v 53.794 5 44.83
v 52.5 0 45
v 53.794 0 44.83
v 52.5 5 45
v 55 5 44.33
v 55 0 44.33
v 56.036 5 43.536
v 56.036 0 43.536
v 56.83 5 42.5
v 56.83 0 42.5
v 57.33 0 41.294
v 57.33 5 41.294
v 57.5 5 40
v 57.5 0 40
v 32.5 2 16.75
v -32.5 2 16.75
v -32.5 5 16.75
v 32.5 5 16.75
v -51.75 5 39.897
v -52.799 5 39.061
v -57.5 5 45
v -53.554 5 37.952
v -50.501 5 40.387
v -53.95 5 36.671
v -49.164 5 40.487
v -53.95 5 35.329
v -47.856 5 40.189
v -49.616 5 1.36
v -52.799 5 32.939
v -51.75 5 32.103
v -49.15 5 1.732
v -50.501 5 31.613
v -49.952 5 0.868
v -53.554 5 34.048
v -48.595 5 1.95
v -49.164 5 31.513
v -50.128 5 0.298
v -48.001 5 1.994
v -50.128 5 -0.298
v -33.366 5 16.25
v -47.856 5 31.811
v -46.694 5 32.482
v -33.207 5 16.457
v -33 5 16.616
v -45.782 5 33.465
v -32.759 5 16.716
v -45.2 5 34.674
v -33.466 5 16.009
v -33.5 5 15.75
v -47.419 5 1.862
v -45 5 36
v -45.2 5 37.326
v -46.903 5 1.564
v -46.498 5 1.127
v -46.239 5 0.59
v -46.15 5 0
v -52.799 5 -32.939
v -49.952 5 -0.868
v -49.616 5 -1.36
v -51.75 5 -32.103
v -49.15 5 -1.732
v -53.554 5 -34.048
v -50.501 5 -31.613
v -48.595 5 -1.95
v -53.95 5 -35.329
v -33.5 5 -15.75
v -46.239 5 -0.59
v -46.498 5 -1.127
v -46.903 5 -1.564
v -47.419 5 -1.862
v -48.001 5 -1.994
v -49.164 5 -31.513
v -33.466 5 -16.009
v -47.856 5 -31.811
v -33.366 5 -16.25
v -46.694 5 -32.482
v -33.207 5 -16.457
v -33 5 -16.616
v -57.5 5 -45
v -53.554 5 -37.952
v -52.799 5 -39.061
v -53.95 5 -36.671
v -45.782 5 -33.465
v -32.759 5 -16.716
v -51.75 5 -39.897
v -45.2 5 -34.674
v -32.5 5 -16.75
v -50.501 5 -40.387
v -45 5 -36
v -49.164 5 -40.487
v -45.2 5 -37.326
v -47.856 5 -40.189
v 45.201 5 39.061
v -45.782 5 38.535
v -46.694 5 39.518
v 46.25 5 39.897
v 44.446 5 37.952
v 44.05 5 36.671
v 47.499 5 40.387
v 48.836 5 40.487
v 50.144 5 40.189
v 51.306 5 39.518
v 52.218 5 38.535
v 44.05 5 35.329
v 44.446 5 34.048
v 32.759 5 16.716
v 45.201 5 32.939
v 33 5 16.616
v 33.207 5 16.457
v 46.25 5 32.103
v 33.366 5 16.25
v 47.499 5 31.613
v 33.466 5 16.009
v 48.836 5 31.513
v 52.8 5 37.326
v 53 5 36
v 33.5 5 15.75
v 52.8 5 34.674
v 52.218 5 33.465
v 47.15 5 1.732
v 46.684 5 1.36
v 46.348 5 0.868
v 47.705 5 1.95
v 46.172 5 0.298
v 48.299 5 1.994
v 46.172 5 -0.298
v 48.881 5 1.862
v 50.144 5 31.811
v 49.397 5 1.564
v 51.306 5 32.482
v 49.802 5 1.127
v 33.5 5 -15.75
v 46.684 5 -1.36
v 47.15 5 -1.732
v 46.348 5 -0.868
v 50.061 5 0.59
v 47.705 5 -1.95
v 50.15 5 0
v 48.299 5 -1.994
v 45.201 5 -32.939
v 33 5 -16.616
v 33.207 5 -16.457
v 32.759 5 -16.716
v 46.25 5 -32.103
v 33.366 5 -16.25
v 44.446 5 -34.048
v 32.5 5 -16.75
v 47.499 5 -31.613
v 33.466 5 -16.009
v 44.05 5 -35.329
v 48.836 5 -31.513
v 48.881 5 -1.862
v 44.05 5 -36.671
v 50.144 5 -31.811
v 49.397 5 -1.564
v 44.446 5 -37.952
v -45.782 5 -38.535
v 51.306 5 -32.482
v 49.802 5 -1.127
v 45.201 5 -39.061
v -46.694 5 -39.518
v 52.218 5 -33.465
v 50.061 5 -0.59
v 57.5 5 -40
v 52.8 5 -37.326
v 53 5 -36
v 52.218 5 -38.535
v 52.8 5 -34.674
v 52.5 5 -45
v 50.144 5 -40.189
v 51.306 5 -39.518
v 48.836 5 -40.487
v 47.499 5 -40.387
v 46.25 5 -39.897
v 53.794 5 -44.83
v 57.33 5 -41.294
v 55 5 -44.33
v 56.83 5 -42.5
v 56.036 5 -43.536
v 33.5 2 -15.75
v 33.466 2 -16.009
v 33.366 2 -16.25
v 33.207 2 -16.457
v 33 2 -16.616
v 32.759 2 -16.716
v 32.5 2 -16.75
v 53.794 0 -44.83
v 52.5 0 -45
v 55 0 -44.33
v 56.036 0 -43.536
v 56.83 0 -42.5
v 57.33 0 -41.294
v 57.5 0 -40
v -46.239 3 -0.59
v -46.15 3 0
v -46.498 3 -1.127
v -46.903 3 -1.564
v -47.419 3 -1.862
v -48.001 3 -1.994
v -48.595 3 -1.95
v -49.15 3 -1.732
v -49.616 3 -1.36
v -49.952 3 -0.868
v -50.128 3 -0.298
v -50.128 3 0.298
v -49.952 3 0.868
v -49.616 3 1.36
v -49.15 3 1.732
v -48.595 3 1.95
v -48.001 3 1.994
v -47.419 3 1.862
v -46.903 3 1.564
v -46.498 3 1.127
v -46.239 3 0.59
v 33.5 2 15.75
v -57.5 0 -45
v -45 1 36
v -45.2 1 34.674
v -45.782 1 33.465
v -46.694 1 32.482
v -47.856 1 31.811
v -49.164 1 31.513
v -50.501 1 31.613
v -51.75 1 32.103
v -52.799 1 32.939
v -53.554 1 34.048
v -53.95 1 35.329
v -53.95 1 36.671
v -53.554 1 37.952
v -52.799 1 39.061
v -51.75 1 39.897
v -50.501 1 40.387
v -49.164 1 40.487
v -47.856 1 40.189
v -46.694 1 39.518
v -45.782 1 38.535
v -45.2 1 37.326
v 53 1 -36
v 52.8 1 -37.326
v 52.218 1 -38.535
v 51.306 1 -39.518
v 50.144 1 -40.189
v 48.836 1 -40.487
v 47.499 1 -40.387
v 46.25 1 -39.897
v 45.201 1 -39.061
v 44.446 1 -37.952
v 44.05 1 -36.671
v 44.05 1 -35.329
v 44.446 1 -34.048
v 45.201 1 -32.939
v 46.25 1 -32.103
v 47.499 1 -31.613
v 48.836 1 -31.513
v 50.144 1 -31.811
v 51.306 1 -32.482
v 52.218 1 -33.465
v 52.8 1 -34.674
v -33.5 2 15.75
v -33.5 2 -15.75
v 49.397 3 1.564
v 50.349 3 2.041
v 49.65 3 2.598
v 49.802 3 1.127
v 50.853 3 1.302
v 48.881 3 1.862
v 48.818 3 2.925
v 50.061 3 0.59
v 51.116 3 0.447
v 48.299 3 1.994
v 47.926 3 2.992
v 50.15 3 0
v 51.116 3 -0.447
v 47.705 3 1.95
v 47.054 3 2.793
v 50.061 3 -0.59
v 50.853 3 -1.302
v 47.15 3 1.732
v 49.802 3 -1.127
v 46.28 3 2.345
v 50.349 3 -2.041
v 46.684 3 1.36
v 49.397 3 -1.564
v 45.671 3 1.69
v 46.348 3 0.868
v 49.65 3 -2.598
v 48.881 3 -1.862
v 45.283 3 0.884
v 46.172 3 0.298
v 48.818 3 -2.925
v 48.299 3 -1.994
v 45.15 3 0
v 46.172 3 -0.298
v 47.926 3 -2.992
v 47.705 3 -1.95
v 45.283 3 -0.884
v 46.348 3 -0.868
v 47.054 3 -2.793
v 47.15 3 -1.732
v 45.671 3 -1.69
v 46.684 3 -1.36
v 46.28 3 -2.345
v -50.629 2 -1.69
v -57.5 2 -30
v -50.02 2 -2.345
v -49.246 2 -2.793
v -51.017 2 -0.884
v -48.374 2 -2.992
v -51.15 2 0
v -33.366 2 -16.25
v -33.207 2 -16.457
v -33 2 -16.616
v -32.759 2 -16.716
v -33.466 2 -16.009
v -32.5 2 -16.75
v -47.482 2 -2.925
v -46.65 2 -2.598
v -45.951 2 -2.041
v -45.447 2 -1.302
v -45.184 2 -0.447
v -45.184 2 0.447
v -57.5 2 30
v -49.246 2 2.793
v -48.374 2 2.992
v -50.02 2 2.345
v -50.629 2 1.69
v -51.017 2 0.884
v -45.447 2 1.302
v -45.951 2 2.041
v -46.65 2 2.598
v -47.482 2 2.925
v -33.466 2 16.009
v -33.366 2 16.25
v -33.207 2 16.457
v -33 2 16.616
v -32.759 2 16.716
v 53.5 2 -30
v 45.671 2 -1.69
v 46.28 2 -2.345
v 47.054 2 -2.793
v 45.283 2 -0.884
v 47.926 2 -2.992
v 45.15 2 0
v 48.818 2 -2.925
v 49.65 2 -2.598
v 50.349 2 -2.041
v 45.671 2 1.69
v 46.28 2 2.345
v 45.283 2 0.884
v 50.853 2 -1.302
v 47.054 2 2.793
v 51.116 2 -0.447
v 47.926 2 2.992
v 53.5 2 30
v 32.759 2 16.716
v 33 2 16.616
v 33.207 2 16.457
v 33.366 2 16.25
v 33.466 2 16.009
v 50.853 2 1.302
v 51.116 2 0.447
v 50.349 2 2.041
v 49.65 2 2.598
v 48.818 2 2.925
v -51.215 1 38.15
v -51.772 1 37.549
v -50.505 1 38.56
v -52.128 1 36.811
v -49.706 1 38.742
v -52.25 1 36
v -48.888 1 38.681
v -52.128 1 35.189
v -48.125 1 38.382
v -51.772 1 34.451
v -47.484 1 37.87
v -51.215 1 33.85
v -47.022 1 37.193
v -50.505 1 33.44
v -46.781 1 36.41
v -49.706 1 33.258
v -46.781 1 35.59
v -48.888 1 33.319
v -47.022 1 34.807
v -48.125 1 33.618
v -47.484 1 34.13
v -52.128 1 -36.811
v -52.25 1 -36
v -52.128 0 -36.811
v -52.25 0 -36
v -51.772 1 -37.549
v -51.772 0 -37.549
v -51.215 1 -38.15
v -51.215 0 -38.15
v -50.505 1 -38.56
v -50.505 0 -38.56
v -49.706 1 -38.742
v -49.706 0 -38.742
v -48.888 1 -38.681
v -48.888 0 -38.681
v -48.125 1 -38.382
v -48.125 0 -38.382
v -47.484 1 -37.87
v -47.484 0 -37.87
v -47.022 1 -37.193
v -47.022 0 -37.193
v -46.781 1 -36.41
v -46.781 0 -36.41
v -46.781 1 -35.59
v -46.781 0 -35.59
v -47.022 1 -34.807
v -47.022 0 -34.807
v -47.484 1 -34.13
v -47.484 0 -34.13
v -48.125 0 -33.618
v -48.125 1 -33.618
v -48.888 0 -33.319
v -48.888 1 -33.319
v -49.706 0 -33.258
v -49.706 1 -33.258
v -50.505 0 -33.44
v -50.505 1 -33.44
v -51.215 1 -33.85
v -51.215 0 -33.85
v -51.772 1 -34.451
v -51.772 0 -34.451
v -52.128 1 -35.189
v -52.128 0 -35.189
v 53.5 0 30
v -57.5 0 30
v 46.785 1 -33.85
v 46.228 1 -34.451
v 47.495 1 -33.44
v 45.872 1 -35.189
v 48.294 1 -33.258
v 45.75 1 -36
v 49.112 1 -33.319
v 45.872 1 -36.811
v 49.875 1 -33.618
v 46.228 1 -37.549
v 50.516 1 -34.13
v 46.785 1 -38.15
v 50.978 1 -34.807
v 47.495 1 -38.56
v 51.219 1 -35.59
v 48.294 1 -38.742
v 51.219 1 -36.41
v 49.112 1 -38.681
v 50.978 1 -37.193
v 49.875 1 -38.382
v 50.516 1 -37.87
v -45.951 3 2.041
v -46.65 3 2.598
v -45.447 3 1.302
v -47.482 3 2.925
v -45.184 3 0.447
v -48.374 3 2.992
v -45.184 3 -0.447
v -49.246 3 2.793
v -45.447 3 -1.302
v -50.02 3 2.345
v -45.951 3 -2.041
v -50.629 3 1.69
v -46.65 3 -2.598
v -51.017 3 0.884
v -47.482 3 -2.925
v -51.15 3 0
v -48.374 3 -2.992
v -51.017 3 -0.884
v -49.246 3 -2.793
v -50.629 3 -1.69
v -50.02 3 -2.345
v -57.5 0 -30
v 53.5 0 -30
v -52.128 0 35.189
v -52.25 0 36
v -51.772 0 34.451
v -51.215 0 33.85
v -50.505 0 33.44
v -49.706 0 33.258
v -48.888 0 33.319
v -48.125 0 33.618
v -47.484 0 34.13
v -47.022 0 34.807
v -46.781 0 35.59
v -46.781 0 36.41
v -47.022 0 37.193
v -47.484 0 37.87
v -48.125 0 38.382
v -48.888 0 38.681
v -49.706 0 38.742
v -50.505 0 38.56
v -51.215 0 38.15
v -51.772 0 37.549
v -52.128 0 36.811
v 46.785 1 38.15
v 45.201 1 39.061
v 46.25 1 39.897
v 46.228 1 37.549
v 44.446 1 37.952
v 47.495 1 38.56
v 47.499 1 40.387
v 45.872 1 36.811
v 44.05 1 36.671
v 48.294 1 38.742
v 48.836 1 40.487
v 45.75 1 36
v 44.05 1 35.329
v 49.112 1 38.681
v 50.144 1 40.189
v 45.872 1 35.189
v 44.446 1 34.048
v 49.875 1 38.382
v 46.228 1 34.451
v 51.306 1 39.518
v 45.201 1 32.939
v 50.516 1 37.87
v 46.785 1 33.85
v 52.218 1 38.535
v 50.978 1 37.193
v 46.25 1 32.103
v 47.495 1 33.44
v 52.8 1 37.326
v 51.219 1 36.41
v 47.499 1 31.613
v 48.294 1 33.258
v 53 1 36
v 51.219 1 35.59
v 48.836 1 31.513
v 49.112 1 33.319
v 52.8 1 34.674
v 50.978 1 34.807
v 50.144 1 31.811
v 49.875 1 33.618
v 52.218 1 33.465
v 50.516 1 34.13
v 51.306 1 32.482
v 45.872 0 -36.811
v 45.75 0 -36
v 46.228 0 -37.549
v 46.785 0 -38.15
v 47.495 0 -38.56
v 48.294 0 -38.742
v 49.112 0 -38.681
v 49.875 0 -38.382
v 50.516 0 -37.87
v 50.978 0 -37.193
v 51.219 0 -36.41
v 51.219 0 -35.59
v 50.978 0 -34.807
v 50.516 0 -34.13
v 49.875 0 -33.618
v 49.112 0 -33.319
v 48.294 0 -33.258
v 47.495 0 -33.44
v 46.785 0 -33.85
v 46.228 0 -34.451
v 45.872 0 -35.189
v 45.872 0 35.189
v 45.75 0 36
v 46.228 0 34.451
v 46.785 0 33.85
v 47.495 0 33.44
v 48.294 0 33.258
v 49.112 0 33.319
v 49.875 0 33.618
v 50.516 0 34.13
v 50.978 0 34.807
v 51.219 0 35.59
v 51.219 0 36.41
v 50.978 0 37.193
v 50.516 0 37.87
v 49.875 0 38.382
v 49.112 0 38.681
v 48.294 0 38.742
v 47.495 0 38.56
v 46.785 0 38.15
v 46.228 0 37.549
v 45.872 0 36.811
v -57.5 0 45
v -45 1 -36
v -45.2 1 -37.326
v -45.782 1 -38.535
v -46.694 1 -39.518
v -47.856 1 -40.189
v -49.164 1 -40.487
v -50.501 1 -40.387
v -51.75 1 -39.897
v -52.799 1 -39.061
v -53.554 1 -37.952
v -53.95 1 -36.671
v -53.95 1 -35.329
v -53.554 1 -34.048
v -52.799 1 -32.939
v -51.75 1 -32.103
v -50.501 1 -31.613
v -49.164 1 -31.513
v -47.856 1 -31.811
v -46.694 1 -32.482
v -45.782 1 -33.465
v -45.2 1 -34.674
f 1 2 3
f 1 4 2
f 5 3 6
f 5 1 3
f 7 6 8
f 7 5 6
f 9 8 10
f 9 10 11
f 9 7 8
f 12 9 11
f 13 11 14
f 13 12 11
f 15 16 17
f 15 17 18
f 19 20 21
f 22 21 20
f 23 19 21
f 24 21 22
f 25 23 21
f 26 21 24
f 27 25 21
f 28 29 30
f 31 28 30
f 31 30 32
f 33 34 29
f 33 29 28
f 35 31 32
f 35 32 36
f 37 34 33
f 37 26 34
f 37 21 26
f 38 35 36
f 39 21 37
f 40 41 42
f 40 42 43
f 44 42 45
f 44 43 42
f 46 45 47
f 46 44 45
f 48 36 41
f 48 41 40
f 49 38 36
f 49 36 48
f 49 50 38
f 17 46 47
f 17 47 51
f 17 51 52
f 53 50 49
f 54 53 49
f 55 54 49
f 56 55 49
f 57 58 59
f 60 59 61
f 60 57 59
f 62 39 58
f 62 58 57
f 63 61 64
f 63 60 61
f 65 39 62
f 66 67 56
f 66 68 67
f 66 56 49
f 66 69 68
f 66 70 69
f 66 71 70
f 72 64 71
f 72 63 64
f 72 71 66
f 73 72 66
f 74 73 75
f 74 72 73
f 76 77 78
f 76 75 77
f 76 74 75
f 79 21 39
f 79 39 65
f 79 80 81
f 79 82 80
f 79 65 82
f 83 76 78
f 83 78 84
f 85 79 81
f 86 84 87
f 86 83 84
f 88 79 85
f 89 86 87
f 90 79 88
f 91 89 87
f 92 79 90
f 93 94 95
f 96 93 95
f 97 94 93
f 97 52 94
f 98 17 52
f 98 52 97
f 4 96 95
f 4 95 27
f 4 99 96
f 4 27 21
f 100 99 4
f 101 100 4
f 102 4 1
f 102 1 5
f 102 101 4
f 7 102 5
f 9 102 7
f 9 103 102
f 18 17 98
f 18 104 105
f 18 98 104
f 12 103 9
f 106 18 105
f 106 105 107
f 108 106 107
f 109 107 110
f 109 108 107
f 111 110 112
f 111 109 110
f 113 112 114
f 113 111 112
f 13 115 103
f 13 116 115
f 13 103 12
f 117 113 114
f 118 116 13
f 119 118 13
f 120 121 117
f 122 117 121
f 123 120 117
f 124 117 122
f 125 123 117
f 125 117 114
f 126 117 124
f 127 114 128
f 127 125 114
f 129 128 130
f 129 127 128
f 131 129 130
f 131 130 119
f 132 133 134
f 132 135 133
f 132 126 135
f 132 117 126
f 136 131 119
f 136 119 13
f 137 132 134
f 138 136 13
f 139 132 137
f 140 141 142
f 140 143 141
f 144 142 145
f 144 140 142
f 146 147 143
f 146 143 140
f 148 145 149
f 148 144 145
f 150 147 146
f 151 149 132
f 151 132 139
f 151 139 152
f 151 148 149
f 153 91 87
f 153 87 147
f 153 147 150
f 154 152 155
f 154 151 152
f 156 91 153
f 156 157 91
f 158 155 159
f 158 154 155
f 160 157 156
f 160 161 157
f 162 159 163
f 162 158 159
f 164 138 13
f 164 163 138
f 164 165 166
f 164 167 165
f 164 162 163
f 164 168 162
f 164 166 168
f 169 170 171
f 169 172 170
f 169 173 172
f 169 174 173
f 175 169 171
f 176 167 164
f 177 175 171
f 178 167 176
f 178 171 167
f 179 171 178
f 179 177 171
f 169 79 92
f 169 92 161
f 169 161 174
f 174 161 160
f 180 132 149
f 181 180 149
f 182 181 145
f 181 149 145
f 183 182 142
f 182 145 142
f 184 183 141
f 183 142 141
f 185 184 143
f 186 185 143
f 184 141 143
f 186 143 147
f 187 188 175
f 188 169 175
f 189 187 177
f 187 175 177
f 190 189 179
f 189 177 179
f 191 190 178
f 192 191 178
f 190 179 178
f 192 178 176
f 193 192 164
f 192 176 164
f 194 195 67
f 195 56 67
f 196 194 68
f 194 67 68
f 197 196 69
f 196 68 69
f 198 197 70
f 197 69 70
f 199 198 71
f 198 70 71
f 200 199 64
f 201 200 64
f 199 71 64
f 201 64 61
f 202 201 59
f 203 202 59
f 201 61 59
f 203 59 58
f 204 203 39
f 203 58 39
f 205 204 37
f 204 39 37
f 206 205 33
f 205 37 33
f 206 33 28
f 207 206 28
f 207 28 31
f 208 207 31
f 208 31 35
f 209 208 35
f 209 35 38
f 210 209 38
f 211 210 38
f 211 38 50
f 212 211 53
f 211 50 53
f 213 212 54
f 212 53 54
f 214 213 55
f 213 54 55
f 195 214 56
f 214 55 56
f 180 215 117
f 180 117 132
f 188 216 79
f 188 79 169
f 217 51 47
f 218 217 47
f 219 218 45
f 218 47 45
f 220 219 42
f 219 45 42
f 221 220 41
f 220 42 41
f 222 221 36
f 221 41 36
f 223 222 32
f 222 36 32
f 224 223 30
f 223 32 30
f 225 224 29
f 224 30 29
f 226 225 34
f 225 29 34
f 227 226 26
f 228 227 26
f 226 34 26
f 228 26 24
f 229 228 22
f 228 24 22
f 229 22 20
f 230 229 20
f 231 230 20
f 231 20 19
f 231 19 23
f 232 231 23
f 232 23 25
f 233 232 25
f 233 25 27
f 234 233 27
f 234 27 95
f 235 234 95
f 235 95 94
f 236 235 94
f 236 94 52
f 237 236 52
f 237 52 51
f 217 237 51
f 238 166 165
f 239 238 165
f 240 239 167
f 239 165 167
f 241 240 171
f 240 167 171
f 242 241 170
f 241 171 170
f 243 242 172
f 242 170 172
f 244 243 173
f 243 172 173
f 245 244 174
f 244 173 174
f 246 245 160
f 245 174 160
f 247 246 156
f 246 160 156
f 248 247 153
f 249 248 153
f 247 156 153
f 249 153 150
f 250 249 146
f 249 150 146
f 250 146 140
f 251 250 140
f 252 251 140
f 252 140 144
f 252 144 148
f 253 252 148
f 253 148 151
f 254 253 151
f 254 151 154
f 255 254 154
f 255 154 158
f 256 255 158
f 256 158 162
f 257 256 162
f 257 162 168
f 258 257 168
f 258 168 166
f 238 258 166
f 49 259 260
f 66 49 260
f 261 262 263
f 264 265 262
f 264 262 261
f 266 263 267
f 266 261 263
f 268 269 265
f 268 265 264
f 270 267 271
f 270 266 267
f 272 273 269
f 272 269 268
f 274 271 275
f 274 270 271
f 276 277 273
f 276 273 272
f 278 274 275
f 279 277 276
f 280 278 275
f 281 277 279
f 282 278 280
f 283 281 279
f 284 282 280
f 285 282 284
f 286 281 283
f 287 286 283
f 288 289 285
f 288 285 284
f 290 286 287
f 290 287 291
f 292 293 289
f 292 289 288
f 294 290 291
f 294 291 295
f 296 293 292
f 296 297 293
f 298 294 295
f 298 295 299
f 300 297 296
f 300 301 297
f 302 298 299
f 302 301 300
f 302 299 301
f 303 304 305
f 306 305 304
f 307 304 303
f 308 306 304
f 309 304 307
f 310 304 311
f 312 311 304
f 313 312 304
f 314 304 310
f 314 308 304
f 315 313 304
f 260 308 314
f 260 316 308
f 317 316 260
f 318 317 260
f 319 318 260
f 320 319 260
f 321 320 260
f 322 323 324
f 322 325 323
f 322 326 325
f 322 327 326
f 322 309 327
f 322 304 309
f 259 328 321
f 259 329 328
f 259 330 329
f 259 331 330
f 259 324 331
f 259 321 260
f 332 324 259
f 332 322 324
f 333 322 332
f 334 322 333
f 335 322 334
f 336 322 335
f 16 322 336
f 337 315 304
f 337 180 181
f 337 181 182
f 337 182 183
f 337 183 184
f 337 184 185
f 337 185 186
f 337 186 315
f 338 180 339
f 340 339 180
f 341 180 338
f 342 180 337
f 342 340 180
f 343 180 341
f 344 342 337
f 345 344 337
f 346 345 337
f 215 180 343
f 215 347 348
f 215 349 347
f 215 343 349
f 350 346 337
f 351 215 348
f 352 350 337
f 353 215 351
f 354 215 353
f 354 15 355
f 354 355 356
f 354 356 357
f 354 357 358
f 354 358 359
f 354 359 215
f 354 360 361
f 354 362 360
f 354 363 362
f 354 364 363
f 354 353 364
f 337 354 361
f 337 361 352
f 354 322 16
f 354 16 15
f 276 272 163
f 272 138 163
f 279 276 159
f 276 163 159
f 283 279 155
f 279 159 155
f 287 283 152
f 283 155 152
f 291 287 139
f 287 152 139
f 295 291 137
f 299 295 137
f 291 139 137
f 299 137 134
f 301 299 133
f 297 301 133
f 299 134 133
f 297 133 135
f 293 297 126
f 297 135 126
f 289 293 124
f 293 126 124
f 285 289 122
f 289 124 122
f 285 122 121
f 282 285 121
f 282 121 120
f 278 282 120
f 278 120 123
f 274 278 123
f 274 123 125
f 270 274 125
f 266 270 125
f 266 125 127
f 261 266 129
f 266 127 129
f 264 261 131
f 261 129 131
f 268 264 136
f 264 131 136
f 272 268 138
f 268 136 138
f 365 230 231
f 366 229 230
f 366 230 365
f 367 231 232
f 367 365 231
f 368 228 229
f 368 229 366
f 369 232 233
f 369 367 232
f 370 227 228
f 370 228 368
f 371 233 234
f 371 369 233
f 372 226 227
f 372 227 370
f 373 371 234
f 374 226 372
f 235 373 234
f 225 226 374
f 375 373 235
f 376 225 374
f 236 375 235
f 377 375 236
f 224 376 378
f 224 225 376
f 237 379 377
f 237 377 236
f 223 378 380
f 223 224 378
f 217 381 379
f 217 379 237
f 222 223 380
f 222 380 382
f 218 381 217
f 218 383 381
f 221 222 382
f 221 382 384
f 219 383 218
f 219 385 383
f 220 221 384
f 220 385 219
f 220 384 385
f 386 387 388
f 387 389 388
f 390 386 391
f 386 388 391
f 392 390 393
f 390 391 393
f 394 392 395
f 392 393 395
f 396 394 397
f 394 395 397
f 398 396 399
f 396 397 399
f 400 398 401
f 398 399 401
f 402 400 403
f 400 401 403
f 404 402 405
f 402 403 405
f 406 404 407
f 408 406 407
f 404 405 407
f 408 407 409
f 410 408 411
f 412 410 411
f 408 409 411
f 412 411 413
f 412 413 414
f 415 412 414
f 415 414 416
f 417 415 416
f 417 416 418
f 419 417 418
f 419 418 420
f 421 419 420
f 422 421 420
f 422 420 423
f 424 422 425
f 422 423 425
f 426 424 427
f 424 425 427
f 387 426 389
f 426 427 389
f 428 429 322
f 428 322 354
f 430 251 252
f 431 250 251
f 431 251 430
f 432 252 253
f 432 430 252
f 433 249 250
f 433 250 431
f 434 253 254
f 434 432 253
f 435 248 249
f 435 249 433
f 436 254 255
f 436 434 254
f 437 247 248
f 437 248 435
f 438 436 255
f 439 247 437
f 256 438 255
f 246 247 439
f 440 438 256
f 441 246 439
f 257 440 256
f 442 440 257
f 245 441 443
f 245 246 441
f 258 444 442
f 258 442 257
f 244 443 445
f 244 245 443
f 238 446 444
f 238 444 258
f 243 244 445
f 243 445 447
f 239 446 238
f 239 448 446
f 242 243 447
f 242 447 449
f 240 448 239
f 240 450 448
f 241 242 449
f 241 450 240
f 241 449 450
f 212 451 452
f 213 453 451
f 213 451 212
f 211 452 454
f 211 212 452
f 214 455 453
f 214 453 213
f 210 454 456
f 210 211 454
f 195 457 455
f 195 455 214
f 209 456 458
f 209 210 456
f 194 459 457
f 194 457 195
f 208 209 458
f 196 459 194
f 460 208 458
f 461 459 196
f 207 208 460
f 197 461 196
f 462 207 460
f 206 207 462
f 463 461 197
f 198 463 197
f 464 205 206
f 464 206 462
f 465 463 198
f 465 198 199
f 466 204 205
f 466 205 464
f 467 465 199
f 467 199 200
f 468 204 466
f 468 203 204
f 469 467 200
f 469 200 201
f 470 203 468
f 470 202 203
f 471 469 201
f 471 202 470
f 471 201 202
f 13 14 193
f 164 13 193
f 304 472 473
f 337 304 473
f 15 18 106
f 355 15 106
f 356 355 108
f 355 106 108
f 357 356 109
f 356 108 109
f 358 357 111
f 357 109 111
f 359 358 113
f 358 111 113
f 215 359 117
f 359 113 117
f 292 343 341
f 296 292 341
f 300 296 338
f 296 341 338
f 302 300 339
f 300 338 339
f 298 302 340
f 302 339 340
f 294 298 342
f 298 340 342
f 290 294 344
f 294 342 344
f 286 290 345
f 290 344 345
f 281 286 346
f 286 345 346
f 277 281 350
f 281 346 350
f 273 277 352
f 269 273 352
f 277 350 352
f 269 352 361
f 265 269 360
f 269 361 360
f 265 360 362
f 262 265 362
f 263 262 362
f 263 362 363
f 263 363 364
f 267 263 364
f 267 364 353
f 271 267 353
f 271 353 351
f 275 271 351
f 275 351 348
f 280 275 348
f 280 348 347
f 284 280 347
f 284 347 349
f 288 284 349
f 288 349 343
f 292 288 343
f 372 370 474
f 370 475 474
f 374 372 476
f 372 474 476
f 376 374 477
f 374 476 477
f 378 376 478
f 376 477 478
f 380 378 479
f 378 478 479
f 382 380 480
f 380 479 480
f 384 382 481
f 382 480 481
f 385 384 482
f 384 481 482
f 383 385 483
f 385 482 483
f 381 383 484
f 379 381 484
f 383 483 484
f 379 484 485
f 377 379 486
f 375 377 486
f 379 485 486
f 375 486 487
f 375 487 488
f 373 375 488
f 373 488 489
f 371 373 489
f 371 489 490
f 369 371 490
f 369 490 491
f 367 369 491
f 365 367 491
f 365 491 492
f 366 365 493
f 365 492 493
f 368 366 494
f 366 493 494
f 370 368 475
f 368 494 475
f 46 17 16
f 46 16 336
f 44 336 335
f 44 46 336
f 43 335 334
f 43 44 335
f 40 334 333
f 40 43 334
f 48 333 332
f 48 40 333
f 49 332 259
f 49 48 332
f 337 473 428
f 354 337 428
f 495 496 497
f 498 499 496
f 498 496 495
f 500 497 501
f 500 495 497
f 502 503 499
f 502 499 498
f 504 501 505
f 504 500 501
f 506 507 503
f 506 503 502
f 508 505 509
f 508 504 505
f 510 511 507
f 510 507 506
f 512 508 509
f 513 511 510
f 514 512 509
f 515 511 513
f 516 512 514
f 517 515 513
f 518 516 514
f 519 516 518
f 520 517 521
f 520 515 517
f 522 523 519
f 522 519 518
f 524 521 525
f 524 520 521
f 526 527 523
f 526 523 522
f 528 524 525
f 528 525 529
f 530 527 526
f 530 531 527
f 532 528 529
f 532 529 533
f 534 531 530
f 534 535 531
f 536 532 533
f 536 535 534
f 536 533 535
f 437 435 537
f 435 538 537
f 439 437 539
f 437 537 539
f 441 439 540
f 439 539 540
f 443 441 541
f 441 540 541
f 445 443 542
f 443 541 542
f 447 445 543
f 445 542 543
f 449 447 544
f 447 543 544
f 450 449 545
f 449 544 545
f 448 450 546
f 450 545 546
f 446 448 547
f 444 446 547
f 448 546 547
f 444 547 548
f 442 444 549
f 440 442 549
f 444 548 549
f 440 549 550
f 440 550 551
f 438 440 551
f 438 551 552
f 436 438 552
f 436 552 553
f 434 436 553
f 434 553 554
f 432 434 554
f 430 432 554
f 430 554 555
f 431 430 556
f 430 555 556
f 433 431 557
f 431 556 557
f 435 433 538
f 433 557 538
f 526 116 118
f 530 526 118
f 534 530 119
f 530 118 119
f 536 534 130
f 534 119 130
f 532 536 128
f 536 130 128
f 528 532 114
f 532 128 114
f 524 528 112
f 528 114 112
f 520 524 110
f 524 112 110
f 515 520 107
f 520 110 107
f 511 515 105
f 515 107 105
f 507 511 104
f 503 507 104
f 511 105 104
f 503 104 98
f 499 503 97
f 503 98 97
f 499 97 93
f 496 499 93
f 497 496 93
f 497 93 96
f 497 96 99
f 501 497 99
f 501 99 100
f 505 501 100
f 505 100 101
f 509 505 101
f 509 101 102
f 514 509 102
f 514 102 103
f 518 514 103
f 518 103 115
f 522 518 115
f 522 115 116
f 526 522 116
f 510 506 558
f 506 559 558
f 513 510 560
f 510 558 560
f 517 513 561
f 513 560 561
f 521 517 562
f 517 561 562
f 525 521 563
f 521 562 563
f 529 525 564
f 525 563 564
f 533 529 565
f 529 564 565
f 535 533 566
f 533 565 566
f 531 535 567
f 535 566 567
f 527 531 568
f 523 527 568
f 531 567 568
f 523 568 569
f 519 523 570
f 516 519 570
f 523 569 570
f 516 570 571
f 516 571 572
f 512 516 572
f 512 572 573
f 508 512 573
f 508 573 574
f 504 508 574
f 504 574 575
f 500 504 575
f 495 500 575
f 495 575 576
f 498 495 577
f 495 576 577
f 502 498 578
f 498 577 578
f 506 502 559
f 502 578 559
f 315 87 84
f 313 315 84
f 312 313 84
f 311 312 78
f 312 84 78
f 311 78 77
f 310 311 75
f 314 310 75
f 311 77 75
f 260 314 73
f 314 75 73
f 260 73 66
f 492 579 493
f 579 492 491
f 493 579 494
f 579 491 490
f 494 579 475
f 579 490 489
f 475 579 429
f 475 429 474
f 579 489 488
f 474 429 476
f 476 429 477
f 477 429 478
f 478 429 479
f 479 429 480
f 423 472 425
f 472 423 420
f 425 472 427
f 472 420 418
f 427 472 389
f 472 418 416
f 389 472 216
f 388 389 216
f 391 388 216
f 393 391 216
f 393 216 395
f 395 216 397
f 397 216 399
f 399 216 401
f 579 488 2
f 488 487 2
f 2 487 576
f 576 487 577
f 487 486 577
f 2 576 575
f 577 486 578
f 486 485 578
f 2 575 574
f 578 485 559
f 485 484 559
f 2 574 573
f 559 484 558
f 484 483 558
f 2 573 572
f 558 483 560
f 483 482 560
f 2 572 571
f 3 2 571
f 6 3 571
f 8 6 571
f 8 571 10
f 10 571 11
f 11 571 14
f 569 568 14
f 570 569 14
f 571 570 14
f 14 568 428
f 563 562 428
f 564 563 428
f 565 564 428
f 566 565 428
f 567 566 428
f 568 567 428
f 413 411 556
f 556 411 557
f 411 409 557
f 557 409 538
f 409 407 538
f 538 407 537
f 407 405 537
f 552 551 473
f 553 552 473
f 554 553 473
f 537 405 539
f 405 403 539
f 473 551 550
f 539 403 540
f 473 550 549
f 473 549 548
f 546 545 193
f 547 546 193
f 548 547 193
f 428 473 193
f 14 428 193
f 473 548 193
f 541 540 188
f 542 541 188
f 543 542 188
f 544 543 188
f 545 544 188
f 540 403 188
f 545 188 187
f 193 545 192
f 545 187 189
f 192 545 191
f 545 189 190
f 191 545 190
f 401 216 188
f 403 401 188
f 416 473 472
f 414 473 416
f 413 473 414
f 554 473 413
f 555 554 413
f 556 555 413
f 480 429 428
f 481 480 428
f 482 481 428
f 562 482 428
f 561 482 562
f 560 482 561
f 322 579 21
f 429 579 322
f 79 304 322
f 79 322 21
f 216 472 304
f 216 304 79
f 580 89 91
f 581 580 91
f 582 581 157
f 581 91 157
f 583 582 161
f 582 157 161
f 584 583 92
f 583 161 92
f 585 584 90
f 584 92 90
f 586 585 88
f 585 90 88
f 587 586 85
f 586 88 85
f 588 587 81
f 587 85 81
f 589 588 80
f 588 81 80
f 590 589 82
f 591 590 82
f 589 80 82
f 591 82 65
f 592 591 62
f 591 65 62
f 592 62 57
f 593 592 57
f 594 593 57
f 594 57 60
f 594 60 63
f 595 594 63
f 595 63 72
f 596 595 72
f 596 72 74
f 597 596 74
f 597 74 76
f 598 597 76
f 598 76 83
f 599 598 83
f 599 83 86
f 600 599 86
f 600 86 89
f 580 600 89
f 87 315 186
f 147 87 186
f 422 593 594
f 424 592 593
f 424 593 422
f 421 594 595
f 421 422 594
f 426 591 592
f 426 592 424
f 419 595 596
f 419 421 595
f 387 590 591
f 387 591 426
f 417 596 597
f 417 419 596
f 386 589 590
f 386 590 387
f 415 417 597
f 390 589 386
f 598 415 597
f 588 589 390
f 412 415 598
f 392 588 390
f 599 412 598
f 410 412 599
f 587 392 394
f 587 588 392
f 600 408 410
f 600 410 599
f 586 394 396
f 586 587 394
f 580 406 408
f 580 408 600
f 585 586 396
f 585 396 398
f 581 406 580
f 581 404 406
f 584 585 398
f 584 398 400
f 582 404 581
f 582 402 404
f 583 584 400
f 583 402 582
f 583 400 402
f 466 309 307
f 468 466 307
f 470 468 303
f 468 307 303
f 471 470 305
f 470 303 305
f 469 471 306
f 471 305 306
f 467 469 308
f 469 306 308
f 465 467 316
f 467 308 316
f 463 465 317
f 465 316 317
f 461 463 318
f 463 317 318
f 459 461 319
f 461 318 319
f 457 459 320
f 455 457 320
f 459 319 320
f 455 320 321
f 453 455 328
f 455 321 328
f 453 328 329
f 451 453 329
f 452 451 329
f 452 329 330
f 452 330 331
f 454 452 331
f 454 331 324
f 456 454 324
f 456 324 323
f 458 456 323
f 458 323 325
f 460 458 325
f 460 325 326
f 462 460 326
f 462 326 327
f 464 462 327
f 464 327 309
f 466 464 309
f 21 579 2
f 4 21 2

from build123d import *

# Parameters (mm, degrees)
SKETCH1_W                      = 115
SKETCH1_H                      = 90
SKETCH1_W_2                    = 67
SKETCH1_H_2                    = 33.5
BOSS_EXTRUDE1_DEPTH            = 5
FILLET1_R                      = 5
FILLET2_R                      = 1
CBORE_FOR_M5_SHCS1_D           = 5.5
CBORE_FOR_M5_SHCS1_CBORE_D     = 9
CBORE_FOR_M5_SHCS1_CBORE_DEPTH = 4
SKETCH5_W                      = 111
SKETCH5_H                      = 60
CUT_EXTRUDE1_DEPTH             = 2
CBORE_FOR_M5_SHCS2_D           = 4
CBORE_FOR_M5_SHCS2_CBORE_D     = 6
CBORE_FOR_M5_SHCS2_CBORE_DEPTH = 1


with BuildPart() as part:
    # Sketch1 → Boss-Extrude1 (new body)
    with BuildSketch(Plane(origin=(0, 0, 0), x_dir=(1, 0, 0), z_dir=(0, 1, 0))):
        Rectangle(SKETCH1_W, SKETCH1_H)
        Rectangle(SKETCH1_W_2, SKETCH1_H_2, mode=Mode.SUBTRACT)
    extrude(amount=BOSS_EXTRUDE1_DEPTH)

    # Fillet1
    fillet1_edges = [part.edges().sort_by_distance(p)[0] for p in [
        (57.5, 2.5, -45),
        (57.5, 2.5, 45),
    ]]
    fillet(fillet1_edges, radius=FILLET1_R)

    # Fillet2
    fillet2_edges = [part.edges().sort_by_distance(p)[0] for p in [
        (-33.5, 2.5, 16.75),
        (33.5, 2.5, 16.75),
        (33.5, 2.5, -16.75),
        (-33.5, 2.5, -16.75),
    ]]
    fillet(fillet2_edges, radius=FILLET2_R)

    # CBORE for M5 SHCS1 (through all)
    with Locations(Plane(origin=(0, 5, 0), x_dir=(1, 0, 0), z_dir=(0, 1, 0))):
        with Locations((-49.5, 36), (-49.5, -36), (48.5, -36), (48.5, 36)):
            CounterBoreHole(CBORE_FOR_M5_SHCS1_D / 2, CBORE_FOR_M5_SHCS1_CBORE_D / 2, CBORE_FOR_M5_SHCS1_CBORE_DEPTH)

    # Sketch5 → Cut-Extrude1 (cut)
    with BuildSketch(Plane.XZ):
        with Locations((-2, 0)):
            Rectangle(SKETCH5_W, SKETCH5_H)
    extrude(amount=-CUT_EXTRUDE1_DEPTH, mode=Mode.SUBTRACT)

    # CBORE for M5 SHCS2 (through all)
    with Locations(Plane(origin=(0, 2, 0), x_dir=(-1, 0, 0), z_dir=(0, -1, 0))):
        with Locations((48.15, 0), (-48.15, 0)):
            CounterBoreHole(CBORE_FOR_M5_SHCS2_D / 2, CBORE_FOR_M5_SHCS2_CBORE_D / 2, CBORE_FOR_M5_SHCS2_CBORE_DEPTH)


solid = part.part
